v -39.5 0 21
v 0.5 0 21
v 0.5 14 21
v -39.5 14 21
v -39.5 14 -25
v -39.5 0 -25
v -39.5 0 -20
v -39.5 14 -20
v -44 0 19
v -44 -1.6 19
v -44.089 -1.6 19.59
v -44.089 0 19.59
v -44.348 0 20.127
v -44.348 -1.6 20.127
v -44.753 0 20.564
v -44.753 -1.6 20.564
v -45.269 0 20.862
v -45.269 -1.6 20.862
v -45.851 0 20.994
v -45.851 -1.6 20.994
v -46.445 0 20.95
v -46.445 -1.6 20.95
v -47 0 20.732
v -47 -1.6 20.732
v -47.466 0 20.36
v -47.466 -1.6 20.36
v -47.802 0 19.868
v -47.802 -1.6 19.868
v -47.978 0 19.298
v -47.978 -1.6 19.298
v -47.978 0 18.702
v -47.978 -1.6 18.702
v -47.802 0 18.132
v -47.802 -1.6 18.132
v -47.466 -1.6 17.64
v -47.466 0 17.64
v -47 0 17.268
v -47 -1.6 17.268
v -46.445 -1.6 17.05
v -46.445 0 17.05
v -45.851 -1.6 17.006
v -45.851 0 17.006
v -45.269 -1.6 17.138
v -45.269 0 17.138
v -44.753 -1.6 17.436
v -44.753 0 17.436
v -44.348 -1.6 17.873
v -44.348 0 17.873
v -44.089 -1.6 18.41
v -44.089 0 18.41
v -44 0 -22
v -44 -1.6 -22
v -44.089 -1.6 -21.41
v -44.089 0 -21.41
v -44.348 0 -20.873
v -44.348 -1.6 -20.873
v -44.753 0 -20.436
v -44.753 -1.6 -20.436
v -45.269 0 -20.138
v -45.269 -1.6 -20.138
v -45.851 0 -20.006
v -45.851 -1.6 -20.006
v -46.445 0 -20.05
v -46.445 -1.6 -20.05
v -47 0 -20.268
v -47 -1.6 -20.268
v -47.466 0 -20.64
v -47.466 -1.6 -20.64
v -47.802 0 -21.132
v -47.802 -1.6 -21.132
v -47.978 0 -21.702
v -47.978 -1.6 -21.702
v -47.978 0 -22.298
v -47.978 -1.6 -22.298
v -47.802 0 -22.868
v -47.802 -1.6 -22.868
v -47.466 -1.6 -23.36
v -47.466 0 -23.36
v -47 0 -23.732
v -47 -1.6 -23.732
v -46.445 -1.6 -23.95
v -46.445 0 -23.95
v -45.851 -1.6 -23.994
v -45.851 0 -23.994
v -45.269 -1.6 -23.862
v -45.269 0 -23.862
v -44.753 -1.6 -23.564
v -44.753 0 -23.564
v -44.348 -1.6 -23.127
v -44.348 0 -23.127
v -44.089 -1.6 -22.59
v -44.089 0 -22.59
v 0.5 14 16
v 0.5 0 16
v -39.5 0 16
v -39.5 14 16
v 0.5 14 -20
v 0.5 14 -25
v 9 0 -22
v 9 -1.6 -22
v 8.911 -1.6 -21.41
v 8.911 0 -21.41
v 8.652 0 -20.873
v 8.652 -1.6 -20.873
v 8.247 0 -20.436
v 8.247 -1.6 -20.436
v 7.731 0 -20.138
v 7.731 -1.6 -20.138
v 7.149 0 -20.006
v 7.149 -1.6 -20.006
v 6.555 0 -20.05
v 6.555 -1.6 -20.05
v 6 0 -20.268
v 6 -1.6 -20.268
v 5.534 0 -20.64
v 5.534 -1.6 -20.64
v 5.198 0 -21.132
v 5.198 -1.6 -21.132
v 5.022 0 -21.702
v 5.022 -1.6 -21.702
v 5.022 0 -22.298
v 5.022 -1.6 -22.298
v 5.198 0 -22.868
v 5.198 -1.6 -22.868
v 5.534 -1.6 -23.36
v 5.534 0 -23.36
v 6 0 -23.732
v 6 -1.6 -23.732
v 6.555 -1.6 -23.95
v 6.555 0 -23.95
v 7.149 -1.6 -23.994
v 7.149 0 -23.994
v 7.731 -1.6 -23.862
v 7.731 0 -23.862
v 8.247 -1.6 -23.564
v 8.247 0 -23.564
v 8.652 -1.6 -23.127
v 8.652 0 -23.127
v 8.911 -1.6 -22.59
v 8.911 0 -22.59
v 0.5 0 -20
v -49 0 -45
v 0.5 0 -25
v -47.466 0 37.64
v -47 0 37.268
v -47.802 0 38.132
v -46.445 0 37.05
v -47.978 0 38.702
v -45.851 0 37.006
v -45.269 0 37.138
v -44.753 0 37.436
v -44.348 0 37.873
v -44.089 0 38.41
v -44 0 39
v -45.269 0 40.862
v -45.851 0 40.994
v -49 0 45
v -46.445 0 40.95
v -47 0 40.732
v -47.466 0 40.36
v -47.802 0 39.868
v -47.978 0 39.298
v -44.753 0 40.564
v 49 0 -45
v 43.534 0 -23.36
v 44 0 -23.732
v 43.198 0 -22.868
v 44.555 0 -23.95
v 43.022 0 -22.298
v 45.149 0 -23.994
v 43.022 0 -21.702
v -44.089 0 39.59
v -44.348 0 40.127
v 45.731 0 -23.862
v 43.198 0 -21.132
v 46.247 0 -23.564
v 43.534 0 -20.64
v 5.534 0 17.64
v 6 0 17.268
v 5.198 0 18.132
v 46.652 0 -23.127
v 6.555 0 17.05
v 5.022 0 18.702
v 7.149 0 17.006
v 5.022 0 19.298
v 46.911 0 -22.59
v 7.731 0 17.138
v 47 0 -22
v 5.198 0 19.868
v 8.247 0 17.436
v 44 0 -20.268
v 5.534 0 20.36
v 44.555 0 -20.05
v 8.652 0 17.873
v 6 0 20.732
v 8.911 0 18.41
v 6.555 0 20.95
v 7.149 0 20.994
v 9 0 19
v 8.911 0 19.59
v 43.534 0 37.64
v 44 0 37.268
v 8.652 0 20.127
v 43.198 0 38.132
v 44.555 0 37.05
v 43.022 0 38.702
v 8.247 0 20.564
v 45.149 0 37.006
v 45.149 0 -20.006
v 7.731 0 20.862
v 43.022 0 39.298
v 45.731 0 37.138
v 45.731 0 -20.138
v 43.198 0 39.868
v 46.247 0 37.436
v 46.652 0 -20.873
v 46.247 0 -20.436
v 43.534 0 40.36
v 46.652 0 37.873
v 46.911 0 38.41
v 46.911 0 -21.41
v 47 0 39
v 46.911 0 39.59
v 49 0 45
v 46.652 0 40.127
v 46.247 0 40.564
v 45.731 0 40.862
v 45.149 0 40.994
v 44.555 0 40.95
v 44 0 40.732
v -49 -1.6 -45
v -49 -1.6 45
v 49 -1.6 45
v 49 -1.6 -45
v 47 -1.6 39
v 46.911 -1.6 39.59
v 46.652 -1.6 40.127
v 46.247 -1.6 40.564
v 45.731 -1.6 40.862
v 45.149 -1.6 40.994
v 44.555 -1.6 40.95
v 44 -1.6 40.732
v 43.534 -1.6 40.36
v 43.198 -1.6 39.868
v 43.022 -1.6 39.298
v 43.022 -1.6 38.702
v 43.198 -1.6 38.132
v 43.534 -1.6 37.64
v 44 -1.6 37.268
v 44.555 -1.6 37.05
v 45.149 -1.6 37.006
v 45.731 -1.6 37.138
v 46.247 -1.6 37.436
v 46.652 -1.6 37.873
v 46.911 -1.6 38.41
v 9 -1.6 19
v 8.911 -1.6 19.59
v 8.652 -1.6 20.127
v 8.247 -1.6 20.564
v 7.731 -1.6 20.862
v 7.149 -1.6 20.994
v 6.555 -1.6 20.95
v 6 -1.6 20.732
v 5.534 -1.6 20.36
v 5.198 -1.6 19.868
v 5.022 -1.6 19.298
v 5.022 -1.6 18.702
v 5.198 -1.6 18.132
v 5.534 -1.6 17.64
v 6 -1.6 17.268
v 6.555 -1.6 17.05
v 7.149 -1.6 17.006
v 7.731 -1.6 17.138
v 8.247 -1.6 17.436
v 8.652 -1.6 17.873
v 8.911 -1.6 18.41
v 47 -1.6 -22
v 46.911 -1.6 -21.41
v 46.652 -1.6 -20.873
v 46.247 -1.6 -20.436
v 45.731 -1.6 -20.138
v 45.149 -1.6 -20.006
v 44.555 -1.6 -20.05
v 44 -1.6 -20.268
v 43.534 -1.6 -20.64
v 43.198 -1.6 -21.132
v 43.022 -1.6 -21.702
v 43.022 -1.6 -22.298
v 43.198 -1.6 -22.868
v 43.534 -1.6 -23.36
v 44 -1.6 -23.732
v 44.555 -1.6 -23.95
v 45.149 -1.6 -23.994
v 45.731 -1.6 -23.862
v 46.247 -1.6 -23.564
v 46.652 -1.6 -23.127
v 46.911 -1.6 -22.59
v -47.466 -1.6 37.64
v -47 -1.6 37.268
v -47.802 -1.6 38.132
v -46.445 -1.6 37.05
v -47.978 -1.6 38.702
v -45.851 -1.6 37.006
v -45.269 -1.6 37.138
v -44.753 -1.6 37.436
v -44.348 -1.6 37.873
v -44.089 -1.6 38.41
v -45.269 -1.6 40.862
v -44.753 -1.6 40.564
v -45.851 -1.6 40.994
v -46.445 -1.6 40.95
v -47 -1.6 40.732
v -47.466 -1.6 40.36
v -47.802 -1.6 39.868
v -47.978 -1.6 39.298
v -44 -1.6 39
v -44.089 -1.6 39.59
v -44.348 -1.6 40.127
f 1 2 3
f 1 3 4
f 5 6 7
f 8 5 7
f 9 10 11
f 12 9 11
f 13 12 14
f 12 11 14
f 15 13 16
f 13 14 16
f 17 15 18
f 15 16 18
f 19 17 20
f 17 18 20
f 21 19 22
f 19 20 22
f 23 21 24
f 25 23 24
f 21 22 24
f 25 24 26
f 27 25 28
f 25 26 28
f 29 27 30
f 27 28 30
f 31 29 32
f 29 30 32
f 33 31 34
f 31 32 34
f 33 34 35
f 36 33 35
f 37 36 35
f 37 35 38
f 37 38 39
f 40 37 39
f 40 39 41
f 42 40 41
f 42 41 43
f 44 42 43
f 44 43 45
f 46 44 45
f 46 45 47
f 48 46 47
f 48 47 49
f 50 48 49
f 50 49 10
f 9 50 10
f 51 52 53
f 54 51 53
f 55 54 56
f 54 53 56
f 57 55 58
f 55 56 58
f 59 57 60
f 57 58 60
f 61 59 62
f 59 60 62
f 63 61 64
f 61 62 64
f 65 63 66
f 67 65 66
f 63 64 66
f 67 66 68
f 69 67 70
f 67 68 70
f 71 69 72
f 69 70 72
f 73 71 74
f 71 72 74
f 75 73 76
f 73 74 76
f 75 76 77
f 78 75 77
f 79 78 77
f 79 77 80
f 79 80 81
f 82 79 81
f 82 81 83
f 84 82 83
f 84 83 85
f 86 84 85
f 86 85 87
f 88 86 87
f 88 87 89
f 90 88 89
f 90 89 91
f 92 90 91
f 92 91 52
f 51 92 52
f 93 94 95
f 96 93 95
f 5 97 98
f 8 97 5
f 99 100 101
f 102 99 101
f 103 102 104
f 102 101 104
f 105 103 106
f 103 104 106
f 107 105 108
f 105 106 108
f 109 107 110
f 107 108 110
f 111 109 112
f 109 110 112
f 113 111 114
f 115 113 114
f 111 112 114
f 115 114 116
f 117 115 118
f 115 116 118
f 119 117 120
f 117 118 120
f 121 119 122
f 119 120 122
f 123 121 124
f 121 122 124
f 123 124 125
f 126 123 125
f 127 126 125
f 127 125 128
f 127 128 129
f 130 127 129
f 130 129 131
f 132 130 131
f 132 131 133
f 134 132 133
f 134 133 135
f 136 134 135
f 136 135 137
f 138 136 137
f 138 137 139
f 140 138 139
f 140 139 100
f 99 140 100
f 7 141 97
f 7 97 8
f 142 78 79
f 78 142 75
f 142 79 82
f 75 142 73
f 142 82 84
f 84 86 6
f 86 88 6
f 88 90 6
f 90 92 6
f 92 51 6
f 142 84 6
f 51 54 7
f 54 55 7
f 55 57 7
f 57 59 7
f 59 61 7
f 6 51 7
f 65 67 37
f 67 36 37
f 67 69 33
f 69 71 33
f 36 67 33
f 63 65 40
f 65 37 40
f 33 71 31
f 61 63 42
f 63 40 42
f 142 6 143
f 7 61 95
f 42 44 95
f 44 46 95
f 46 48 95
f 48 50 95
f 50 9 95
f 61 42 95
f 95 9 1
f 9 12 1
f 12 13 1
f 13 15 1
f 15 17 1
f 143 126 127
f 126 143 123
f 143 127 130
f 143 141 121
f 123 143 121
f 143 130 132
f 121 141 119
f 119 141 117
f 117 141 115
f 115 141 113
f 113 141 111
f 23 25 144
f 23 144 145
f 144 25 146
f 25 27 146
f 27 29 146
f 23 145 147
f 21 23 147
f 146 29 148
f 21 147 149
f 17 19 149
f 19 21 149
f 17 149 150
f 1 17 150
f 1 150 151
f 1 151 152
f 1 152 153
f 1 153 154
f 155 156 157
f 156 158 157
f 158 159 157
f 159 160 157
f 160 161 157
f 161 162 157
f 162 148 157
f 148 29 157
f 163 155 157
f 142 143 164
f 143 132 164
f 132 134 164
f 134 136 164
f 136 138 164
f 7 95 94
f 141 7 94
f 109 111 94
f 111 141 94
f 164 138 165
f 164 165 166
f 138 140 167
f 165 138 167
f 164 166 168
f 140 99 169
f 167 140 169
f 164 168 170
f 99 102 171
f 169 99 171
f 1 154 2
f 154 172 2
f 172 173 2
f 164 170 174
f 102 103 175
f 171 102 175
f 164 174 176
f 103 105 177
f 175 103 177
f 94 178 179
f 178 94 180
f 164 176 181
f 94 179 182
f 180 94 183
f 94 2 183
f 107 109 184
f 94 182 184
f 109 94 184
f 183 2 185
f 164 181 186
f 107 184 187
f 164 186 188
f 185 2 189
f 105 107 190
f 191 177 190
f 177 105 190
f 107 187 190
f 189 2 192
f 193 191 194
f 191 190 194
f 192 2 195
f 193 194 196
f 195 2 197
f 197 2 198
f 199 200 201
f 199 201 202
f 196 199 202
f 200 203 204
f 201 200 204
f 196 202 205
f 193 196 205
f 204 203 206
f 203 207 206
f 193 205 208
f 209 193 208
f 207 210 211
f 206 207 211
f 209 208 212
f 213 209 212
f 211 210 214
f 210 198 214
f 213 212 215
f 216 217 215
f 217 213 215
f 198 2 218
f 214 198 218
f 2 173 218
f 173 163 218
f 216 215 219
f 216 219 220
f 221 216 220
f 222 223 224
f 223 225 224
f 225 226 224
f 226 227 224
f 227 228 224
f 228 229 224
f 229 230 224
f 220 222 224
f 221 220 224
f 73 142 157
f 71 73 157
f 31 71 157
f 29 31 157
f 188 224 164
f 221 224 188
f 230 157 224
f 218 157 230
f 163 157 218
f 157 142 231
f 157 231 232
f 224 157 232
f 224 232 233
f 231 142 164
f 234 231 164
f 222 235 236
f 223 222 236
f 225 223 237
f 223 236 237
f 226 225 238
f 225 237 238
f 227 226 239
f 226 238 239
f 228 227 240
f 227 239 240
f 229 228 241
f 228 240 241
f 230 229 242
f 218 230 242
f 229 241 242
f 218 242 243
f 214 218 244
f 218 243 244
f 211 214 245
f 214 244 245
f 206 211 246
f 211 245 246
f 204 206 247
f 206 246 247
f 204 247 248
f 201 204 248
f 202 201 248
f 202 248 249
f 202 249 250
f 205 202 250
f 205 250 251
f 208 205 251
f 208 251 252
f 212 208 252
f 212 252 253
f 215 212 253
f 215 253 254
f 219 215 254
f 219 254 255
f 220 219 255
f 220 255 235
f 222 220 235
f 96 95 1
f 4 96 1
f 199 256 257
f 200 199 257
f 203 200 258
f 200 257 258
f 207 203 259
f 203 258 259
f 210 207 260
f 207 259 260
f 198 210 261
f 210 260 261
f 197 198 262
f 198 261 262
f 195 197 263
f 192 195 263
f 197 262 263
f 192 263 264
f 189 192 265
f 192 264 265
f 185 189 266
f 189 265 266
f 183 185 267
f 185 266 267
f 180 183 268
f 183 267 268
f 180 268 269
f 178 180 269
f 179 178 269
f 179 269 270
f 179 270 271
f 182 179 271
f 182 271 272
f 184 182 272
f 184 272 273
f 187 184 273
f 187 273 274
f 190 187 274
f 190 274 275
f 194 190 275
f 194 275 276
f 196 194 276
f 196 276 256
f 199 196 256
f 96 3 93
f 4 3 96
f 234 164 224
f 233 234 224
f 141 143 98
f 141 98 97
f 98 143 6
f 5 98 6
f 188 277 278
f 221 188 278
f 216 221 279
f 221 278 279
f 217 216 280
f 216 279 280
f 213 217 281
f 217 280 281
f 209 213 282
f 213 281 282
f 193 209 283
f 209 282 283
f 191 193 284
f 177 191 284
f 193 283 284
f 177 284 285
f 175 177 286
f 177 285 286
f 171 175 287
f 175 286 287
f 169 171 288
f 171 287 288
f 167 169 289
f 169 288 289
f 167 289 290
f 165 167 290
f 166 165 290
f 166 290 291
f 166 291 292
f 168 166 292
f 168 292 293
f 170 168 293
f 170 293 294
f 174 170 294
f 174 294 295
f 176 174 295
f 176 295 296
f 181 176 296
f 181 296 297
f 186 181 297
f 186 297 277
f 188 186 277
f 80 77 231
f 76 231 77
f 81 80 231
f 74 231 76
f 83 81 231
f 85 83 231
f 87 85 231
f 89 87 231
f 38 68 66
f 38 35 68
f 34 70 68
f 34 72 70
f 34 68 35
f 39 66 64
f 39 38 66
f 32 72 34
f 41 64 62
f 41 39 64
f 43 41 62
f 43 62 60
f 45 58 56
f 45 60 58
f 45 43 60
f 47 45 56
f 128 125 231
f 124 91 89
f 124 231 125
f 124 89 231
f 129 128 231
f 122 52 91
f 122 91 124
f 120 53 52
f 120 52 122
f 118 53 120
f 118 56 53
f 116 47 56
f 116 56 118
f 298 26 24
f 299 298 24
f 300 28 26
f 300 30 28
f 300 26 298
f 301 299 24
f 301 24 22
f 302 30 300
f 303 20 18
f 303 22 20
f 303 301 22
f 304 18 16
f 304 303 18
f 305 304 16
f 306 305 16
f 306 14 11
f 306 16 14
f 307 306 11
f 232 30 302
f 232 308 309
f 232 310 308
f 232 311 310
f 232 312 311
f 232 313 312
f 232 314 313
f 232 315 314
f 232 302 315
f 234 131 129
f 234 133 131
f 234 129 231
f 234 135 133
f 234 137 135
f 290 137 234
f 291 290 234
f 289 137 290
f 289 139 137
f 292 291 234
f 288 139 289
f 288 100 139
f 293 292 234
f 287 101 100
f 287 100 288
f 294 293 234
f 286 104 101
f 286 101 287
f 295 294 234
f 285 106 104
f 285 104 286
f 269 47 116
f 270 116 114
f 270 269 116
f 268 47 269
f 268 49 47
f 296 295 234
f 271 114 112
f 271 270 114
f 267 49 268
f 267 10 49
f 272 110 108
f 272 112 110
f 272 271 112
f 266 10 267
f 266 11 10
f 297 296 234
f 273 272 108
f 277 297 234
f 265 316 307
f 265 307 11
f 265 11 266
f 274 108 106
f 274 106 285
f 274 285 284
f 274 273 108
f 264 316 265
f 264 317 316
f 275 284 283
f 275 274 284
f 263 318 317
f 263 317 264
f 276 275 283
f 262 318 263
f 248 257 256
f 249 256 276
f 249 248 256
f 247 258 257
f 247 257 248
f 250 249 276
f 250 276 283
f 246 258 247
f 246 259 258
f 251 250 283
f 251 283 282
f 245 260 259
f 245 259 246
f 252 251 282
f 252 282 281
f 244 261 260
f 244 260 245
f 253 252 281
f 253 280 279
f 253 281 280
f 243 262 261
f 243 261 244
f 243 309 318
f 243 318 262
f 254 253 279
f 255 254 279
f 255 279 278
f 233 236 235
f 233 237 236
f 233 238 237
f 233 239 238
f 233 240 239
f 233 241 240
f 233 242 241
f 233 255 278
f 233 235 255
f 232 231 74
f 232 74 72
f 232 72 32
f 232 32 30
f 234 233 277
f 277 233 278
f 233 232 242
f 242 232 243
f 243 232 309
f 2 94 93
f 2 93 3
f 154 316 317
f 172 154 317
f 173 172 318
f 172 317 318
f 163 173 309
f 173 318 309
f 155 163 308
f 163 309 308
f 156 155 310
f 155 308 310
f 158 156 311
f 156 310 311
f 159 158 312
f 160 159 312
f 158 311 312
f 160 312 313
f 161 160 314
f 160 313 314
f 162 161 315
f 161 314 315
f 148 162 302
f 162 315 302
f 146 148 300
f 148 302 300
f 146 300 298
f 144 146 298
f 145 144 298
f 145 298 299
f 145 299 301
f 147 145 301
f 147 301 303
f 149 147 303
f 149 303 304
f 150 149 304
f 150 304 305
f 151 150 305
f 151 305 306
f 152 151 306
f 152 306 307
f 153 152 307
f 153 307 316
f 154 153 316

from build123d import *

# Parameters (mm, degrees)
F0_W     = 98
F0_H     = 90
F1_DEPTH = 1.6
F2_R     = 2
F3_DEPTH = 25
F4_W     = 40
F4_H     = 5
F5_DEPTH = 14


with BuildPart() as f1:
    # F0 (on Front) → F1 (new body)
    with BuildSketch(Plane.XZ):
        Rectangle(F0_W, F0_H)
    extrude(amount=F1_DEPTH)

    # F2 (on face) → F3 (cut)
    with BuildSketch(Plane.XZ.offset(1.6)):
        with Locations((-46, 39)):
            Circle(F2_R)
        with Locations((-46, 19)):
            Circle(F2_R)
        with Locations((7, 19)):
            Circle(F2_R)
        with Locations((45, 39)):
            Circle(F2_R)
        with Locations((-46, -22)):
            Circle(F2_R)
        with Locations((7, -22)):
            Circle(F2_R)
        with Locations((45, -22)):
            Circle(F2_R)
    extrude(amount=-F3_DEPTH, mode=Mode.SUBTRACT)

    # F4 (on face) → F5 (join)
    with BuildSketch(Plane(origin=(0, 0, 0), x_dir=(-1, 0, 0), z_dir=(0, 1, 0))):
        with Locations((19.5, 18.5)):
            Rectangle(F4_W, F4_H)
        with Locations((19.5, -22.5)):
            Rectangle(F4_W, F4_H)
    extrude(amount=F5_DEPTH)


solid = f1.part
